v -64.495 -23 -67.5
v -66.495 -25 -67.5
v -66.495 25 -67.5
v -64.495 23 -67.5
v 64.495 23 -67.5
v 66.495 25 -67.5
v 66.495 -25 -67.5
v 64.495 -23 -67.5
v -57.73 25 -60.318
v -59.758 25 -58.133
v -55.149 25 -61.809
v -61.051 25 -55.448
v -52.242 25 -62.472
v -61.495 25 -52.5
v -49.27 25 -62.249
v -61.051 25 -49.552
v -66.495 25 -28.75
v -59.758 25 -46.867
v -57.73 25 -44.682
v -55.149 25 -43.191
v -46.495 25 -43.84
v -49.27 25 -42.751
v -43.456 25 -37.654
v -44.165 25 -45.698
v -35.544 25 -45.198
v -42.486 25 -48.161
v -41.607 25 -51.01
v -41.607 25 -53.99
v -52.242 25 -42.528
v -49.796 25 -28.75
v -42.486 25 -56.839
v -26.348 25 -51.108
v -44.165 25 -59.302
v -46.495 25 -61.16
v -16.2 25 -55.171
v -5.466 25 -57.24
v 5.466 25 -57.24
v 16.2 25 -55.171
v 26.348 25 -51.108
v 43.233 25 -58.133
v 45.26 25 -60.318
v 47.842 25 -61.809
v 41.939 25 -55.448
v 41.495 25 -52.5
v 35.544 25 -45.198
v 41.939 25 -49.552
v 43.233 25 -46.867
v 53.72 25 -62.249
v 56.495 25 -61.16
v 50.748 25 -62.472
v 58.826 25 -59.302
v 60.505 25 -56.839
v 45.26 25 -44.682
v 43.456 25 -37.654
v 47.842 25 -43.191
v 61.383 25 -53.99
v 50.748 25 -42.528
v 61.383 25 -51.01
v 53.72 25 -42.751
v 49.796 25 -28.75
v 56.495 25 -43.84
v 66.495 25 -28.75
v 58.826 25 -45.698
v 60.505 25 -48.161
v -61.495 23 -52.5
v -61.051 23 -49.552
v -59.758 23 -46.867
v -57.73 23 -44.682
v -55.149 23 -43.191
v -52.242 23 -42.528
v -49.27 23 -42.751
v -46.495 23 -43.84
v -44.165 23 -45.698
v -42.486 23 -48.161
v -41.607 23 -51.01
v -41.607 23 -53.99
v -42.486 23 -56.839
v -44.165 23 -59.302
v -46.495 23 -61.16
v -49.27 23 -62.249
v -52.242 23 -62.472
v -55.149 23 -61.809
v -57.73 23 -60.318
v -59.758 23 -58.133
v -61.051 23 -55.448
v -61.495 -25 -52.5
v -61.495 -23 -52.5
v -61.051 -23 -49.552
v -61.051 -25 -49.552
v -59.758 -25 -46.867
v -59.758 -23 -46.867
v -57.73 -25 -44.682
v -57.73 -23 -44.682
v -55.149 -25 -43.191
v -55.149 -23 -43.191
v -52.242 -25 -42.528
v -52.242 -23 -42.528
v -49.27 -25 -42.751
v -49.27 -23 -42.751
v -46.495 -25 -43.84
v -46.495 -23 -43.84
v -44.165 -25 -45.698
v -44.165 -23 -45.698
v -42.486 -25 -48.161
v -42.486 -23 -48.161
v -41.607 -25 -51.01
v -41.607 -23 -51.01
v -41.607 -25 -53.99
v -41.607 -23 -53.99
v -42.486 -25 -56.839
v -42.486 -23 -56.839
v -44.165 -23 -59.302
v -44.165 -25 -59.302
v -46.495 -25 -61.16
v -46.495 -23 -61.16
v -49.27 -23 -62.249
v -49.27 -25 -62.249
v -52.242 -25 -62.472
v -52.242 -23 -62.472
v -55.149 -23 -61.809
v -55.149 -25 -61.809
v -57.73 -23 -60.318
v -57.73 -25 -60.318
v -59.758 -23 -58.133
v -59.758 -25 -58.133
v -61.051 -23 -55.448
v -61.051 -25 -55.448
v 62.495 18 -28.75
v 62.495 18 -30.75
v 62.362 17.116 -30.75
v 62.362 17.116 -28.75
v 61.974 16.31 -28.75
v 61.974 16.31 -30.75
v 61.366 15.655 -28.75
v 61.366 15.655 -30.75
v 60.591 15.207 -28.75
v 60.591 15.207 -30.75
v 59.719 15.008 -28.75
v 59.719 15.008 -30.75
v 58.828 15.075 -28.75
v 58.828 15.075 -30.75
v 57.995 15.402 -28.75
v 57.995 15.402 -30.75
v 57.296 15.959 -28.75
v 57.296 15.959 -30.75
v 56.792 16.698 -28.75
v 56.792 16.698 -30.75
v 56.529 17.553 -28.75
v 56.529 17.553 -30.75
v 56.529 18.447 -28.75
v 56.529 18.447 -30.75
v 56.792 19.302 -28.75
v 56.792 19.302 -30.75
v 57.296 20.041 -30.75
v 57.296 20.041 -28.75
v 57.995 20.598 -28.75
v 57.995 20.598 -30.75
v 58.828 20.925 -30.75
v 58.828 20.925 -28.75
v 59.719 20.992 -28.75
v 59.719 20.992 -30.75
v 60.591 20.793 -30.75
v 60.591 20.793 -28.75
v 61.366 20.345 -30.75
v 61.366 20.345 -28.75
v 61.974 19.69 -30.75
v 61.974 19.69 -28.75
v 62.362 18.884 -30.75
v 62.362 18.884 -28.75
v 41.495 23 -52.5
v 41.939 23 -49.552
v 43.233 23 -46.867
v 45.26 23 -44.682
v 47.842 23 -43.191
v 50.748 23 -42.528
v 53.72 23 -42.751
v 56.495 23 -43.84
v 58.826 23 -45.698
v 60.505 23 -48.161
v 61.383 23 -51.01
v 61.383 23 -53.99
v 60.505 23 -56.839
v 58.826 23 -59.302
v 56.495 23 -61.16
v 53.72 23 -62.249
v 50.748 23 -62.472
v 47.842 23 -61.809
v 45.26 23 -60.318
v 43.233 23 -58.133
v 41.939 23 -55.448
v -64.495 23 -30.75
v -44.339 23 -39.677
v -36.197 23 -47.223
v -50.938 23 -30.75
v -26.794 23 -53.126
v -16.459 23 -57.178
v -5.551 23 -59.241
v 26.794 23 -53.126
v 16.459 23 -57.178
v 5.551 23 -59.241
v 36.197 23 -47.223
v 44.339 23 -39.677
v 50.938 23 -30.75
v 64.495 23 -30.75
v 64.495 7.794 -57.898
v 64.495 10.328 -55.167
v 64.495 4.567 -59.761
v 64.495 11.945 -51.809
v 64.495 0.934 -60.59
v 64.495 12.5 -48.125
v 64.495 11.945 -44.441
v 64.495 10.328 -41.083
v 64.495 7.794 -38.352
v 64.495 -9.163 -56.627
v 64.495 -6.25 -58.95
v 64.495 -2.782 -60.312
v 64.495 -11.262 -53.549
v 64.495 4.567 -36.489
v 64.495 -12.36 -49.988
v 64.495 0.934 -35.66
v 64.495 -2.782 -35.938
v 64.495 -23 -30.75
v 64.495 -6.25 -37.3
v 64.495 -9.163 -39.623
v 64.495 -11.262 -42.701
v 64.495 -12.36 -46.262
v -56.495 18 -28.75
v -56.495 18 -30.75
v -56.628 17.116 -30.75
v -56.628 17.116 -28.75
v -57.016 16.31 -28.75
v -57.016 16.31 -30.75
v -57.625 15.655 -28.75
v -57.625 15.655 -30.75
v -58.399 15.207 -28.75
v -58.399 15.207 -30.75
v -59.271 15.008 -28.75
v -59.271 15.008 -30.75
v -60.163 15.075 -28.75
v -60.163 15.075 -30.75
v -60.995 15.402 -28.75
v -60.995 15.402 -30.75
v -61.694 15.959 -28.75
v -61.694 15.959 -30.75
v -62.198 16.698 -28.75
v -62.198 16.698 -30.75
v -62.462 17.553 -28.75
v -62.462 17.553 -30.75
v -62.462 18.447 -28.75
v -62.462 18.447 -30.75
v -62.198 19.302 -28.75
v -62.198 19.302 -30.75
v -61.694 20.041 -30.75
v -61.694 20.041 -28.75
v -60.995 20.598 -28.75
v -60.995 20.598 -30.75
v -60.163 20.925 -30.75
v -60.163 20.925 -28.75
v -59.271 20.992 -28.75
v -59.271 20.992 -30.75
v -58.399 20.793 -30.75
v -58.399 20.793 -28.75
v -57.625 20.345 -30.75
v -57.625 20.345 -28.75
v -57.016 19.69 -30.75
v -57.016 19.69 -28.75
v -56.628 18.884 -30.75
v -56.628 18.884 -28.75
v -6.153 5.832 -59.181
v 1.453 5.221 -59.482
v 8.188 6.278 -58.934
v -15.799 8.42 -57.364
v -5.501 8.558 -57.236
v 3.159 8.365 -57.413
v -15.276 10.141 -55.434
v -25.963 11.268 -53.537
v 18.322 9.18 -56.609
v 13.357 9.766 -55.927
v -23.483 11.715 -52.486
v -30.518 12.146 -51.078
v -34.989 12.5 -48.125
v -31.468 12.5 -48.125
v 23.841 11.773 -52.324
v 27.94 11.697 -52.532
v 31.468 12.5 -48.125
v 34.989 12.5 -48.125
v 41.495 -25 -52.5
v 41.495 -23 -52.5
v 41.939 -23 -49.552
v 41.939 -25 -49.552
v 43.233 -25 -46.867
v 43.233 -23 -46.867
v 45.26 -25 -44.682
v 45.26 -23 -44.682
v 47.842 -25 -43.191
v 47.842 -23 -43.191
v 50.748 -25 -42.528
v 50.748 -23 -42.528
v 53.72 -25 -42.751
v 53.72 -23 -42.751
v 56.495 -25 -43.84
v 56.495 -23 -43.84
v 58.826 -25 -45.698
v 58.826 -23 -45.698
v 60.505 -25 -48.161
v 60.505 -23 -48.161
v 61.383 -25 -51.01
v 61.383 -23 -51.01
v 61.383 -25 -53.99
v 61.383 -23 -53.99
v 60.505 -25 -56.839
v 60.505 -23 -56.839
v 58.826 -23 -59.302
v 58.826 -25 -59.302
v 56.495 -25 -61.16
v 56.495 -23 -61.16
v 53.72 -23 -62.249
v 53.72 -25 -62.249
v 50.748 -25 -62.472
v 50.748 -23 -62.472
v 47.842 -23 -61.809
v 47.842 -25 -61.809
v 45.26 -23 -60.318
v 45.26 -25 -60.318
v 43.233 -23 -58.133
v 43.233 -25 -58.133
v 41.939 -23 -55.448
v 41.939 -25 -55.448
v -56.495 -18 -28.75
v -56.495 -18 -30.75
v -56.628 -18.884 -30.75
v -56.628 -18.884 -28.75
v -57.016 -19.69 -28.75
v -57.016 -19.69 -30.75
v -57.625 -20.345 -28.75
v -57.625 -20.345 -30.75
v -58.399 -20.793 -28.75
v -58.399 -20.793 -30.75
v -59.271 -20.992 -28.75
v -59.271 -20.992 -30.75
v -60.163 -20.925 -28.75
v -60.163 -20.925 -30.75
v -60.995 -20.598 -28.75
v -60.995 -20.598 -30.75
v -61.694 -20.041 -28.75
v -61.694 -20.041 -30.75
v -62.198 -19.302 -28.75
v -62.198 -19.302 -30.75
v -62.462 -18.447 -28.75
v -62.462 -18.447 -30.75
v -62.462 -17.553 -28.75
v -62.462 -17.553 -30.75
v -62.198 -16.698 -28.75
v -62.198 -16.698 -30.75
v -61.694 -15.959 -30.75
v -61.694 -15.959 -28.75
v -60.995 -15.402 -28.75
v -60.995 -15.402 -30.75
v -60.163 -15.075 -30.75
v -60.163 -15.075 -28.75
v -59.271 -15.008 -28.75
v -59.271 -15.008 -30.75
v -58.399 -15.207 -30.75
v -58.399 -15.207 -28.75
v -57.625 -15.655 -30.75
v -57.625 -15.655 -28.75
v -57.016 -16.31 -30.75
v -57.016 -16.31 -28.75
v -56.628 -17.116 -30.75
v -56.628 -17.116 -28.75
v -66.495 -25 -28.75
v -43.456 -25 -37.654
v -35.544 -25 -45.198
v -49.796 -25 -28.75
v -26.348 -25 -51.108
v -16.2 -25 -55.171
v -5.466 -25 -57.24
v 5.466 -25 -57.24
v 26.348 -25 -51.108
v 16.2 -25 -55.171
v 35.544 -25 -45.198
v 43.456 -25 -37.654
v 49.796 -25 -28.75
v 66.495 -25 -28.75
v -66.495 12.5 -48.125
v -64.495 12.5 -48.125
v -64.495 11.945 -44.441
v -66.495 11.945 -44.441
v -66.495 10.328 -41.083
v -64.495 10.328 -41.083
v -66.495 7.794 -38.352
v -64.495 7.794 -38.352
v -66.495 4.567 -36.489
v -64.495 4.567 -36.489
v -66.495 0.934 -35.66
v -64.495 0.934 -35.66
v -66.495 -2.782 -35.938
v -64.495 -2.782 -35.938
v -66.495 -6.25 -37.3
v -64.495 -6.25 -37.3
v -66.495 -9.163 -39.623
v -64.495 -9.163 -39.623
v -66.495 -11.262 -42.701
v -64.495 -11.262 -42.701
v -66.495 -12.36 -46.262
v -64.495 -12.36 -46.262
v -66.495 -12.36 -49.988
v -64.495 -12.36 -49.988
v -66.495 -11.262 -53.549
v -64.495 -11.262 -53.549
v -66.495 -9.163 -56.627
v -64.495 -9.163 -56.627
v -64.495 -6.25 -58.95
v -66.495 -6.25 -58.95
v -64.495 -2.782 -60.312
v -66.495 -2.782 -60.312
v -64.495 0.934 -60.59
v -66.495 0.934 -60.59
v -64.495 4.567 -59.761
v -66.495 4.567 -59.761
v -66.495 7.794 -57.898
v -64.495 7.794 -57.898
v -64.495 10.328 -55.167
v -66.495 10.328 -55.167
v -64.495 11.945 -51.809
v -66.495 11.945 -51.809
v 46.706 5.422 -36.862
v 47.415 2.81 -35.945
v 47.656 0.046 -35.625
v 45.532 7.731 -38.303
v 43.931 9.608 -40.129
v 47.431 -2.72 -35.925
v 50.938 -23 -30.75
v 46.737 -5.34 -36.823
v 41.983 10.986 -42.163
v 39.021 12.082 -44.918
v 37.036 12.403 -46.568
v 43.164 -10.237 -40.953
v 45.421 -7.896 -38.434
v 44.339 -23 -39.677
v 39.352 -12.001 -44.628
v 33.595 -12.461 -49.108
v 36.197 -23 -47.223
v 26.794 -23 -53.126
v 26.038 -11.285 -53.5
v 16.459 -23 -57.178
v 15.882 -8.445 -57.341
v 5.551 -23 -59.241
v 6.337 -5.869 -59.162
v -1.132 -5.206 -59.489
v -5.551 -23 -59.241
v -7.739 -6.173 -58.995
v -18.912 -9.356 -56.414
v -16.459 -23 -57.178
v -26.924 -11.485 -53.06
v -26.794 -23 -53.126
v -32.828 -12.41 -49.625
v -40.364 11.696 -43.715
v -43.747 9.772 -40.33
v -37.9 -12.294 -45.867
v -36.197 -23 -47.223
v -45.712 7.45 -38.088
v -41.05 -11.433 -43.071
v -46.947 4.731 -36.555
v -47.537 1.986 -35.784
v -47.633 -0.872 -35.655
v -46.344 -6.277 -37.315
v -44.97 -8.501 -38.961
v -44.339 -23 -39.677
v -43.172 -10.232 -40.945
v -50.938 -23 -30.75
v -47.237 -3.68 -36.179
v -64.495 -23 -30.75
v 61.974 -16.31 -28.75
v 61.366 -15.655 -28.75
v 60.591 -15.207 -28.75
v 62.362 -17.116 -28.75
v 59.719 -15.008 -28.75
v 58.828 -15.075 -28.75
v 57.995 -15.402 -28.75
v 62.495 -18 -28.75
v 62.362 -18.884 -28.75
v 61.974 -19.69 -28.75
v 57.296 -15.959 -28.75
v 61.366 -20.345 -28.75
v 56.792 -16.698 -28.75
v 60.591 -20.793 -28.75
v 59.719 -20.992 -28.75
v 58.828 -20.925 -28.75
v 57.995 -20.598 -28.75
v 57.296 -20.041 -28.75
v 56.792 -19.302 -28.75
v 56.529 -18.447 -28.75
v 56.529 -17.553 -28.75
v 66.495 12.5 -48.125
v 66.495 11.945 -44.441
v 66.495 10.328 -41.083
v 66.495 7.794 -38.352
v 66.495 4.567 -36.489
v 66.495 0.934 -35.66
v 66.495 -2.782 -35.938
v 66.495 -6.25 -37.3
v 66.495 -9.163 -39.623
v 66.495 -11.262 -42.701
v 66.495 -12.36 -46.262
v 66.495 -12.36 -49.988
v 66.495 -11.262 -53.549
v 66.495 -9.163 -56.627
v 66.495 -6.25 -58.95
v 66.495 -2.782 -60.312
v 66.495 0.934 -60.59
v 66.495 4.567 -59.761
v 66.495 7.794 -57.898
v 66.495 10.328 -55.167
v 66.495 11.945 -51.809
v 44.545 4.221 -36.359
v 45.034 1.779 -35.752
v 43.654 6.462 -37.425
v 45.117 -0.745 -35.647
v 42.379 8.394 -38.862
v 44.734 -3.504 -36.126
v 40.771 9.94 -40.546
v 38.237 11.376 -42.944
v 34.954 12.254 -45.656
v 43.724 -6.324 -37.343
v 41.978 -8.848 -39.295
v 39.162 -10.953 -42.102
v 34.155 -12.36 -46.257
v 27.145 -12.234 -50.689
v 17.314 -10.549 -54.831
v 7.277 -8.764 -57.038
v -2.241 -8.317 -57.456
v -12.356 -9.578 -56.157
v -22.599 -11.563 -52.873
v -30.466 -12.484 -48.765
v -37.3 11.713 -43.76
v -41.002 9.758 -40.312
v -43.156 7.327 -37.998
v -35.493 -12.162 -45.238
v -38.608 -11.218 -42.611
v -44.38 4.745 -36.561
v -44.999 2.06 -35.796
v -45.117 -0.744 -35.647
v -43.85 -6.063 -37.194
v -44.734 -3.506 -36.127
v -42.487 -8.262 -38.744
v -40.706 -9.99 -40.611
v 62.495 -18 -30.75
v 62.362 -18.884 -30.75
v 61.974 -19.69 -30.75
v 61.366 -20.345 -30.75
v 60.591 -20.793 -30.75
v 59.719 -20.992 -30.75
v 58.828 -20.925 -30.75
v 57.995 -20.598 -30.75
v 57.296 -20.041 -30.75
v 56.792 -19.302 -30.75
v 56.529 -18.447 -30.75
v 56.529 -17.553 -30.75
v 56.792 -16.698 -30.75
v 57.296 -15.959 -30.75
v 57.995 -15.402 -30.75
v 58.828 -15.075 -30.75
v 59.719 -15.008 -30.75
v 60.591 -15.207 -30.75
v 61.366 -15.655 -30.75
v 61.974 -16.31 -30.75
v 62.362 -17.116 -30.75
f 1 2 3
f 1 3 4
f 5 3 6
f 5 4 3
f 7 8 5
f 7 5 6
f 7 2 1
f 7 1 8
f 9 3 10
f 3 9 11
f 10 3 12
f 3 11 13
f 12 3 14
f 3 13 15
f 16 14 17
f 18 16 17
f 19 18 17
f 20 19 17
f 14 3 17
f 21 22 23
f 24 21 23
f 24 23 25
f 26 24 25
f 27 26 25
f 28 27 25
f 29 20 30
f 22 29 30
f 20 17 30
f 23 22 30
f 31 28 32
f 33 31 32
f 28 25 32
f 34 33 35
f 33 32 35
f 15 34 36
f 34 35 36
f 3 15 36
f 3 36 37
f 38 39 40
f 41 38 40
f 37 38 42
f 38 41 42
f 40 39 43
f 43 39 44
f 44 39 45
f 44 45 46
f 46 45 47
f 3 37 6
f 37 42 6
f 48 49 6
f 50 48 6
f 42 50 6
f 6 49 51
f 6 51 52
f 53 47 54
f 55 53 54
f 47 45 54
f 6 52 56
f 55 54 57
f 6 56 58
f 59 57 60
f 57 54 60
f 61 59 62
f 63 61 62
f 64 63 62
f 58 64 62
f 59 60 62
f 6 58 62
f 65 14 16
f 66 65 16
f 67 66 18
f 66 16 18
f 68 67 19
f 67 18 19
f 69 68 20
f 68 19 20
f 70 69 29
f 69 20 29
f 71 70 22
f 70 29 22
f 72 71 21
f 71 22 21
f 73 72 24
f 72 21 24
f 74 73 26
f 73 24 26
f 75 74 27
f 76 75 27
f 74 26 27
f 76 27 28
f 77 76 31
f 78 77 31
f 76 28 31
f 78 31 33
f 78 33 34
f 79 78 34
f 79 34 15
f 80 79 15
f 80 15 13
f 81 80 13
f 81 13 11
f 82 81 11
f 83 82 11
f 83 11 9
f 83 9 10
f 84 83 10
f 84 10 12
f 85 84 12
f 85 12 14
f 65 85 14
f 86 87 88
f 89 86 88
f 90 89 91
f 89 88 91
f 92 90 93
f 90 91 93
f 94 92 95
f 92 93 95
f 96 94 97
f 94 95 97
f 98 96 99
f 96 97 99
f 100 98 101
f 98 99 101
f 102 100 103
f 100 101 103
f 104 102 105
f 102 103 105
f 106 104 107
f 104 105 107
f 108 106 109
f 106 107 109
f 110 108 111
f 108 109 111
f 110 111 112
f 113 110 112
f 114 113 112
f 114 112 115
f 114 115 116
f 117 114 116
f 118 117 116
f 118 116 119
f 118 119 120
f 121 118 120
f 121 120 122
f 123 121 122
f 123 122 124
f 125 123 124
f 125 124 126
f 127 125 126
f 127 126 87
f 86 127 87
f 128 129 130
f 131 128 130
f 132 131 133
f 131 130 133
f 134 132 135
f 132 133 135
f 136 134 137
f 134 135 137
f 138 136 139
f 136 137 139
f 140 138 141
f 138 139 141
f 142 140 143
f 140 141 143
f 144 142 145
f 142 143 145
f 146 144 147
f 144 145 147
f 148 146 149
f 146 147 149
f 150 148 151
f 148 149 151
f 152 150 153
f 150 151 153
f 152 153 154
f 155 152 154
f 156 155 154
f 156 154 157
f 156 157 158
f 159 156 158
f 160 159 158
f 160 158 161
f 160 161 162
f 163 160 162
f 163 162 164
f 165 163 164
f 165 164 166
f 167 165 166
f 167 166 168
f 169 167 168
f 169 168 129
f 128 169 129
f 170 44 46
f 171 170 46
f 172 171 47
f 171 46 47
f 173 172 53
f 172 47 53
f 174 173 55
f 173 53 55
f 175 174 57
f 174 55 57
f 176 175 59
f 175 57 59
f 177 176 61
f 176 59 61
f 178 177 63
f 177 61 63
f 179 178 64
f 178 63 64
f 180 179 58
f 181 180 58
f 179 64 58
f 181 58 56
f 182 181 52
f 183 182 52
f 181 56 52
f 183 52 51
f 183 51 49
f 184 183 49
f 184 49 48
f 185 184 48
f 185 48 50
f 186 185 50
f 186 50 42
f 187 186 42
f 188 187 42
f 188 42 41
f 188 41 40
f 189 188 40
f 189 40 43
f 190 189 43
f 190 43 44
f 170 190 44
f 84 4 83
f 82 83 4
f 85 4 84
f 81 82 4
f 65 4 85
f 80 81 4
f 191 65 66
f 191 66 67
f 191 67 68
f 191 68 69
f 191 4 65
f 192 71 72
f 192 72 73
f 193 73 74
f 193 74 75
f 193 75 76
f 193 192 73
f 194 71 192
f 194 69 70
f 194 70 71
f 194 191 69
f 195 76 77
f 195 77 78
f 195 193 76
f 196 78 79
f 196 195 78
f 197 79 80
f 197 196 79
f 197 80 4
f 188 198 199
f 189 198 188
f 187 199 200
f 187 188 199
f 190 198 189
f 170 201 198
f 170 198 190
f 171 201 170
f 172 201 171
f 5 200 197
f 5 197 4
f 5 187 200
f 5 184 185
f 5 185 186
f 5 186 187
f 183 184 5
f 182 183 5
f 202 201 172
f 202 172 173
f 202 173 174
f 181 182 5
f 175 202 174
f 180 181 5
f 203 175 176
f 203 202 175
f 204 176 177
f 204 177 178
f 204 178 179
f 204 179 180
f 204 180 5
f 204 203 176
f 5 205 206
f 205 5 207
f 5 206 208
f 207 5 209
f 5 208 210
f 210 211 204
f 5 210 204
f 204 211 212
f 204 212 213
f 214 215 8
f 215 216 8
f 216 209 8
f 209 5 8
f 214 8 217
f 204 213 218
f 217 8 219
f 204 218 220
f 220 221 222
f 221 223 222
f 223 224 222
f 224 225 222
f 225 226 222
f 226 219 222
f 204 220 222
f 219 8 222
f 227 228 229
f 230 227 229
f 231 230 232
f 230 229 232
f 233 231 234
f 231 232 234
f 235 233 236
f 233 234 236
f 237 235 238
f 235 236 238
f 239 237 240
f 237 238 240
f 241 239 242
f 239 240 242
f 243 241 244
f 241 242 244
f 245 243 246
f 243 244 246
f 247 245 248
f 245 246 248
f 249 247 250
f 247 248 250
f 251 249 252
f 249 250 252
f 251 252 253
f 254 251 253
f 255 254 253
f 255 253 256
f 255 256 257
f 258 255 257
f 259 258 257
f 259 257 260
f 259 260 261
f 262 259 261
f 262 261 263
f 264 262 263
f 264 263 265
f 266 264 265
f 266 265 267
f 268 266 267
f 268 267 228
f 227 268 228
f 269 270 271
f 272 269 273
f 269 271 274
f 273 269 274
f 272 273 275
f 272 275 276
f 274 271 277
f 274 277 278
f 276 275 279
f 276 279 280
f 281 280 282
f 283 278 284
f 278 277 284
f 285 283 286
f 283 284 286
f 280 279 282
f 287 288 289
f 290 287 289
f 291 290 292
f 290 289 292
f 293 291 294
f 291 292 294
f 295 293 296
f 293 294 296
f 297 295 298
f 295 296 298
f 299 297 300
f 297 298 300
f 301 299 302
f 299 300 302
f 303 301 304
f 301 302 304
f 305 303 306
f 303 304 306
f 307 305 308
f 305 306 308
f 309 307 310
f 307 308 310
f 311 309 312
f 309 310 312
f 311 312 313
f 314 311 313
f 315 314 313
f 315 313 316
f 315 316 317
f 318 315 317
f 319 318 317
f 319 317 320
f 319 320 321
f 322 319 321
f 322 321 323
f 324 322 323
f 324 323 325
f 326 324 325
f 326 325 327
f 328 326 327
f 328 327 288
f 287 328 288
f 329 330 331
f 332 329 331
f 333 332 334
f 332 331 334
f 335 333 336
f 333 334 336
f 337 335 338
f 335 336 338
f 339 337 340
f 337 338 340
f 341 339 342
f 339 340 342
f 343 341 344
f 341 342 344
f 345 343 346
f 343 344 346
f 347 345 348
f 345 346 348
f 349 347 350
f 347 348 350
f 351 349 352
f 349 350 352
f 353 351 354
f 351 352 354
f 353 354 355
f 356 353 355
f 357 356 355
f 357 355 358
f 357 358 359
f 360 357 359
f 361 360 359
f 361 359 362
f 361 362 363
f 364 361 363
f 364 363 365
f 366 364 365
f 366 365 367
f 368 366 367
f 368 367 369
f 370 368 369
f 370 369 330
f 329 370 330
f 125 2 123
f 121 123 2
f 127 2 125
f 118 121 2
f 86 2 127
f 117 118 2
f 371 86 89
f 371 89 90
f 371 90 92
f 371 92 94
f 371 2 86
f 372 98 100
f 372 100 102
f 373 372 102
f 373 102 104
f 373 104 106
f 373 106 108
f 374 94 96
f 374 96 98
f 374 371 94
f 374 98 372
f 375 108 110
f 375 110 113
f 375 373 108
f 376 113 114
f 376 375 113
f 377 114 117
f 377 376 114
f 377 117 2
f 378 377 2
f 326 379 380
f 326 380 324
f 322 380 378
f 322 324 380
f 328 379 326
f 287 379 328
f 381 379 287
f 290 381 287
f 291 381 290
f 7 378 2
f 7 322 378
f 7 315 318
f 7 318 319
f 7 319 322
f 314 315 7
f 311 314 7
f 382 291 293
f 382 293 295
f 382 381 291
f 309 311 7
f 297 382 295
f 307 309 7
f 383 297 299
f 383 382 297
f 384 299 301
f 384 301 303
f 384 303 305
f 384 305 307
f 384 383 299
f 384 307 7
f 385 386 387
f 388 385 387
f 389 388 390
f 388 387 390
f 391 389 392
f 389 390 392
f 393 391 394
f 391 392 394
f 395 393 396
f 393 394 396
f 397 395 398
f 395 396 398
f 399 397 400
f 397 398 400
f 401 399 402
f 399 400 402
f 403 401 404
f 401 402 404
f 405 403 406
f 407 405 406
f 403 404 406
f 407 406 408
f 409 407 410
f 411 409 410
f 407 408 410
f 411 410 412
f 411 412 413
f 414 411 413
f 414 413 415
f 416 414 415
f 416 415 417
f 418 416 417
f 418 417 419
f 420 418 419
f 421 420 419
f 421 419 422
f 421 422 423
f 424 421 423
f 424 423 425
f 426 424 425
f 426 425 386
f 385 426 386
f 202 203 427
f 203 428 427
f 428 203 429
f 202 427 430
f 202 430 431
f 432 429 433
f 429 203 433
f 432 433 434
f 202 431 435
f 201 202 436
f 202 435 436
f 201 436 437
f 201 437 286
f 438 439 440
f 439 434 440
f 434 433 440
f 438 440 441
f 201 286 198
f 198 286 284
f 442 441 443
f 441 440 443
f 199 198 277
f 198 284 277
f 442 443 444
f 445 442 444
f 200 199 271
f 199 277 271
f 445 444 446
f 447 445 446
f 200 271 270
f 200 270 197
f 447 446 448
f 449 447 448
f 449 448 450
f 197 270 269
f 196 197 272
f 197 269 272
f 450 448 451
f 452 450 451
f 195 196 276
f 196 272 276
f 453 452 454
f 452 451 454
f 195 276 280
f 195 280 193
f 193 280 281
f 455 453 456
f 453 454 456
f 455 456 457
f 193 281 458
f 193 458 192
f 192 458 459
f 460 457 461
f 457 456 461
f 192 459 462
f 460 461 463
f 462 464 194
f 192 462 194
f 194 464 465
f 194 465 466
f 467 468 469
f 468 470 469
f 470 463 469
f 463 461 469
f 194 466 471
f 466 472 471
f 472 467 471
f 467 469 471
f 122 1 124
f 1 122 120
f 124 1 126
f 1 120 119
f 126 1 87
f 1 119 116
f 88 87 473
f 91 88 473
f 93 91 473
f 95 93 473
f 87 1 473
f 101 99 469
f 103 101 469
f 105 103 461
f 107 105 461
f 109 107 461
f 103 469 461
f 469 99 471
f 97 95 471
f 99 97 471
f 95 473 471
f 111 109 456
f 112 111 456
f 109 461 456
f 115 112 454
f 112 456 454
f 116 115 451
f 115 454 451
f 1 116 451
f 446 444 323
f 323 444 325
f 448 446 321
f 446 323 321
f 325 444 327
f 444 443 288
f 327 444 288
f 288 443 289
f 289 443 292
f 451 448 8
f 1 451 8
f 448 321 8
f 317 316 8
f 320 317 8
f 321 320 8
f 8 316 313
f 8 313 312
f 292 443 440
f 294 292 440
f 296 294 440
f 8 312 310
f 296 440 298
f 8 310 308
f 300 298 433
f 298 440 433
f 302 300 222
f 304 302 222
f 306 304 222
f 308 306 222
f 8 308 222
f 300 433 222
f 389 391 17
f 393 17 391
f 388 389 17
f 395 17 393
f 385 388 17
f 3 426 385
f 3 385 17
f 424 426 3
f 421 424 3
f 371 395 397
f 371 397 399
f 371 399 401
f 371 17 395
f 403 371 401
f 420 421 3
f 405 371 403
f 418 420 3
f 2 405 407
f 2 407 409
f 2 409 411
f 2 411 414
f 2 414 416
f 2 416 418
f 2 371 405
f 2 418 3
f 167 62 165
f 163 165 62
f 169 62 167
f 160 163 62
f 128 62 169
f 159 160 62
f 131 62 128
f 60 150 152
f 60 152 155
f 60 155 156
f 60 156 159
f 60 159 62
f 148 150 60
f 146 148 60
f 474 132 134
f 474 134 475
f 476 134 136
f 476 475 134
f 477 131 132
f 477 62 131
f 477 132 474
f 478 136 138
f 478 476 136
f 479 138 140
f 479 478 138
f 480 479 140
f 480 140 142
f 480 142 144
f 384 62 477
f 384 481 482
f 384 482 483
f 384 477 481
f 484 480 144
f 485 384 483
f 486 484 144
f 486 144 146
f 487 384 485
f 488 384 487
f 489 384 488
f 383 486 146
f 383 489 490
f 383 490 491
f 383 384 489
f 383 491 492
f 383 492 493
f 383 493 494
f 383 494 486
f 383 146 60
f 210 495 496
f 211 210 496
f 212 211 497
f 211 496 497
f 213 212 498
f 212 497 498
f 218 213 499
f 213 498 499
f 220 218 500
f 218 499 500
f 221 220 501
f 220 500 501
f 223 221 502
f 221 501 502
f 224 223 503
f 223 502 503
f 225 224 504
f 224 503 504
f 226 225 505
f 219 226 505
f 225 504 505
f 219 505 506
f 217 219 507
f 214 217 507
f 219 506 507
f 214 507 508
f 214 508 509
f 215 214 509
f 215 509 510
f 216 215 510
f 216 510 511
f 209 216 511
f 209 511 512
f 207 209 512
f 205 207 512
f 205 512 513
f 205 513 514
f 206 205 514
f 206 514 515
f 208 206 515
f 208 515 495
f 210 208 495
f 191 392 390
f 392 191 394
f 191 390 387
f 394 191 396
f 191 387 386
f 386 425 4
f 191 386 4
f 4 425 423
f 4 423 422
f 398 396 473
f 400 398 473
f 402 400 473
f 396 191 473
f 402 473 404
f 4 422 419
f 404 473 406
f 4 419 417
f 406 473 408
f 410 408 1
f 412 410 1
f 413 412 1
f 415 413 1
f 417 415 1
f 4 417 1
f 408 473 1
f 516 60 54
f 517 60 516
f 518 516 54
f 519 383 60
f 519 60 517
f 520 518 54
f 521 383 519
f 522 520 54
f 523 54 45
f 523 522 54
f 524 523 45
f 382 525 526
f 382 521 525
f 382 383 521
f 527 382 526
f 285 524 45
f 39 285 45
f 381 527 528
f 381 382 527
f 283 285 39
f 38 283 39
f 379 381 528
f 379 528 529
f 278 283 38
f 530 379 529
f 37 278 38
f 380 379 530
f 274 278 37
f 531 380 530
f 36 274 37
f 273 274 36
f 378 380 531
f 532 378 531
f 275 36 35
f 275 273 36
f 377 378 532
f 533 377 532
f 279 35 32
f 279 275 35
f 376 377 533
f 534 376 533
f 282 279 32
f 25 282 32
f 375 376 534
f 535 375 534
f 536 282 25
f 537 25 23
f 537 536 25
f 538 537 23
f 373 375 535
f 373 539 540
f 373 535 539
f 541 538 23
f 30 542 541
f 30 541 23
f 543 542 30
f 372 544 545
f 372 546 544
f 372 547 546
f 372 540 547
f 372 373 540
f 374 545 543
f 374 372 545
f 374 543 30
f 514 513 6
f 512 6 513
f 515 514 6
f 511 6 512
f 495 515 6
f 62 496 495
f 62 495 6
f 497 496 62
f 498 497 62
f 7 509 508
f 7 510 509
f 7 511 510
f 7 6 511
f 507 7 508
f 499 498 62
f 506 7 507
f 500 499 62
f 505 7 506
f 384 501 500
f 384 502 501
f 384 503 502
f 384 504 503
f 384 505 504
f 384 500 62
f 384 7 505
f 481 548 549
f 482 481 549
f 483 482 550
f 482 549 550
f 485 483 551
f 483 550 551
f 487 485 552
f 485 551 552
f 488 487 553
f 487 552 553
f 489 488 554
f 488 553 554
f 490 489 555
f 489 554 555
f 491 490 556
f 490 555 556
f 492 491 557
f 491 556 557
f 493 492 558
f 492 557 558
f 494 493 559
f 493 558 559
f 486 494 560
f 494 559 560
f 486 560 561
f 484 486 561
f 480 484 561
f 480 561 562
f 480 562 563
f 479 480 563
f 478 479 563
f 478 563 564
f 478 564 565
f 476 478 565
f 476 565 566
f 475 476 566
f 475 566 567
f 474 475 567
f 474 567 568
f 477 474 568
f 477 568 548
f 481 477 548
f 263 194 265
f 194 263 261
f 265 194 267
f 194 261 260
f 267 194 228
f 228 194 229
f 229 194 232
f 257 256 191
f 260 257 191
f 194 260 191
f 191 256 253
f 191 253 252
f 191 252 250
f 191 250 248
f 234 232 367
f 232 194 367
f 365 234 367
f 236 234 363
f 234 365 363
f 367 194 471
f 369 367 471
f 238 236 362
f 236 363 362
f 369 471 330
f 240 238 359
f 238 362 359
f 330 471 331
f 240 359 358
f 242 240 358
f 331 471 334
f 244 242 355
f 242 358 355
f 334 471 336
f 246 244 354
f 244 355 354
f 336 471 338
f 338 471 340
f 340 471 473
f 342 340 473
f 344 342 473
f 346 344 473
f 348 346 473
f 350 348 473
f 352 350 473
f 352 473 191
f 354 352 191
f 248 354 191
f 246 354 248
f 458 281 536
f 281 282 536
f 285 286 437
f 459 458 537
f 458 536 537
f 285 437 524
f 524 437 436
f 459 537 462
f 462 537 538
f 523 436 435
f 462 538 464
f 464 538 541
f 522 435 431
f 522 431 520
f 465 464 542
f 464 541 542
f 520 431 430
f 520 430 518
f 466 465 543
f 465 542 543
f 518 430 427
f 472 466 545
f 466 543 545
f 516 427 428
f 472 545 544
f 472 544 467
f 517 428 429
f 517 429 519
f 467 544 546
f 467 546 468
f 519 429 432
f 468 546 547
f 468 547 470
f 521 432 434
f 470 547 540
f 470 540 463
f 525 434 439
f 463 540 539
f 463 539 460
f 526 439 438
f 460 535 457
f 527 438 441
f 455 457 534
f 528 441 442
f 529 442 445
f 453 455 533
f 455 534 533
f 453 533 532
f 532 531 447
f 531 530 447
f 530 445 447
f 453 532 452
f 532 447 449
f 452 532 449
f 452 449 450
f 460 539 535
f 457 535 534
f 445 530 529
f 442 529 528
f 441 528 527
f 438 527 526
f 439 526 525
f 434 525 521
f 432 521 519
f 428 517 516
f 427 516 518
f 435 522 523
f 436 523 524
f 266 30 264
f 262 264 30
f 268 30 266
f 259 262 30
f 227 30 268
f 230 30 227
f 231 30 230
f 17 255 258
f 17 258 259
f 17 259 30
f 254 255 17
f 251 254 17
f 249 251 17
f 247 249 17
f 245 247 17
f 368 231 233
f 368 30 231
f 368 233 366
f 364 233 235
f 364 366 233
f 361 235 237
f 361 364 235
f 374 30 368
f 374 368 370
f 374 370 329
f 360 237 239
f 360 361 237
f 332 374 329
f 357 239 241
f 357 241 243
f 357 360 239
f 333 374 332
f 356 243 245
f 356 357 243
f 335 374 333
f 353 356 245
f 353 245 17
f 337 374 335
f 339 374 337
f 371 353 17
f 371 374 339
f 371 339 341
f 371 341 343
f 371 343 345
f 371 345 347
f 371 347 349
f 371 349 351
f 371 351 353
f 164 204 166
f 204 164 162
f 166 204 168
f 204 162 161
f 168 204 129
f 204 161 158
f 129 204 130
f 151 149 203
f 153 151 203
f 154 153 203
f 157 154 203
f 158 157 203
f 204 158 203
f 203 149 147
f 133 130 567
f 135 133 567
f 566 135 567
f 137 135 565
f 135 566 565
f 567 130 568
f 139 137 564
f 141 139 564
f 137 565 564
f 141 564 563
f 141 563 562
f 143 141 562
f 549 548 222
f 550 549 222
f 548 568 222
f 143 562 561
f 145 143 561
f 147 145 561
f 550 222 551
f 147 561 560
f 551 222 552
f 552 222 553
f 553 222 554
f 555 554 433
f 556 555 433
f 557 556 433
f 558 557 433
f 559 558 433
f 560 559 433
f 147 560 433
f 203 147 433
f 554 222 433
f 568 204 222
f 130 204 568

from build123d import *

# Parameters (mm, degrees)
F1_DEPTH      = 25
F1_DEPTH_BACK = 25
F2_T          = -2
F3_R          = 3
F4_DEPTH      = 73
F6_R          = 12.5
F7_DEPTH      = 142.6
F8_R          = 10
F9_DEPTH      = 5
F9_DEPTH_BACK = 60


with BuildPart() as f1:
    # F0 (on Front) → F1 (new body, two sides)
    with BuildSketch(Plane.XZ) as f1_sk:
        with BuildLine():
            ThreePointArc((49.796461, -28.75), (0, -57.5), (-49.796461, -28.75))
            Line((-49.796461, -28.75), (-61.038751, -28.75))
            Line((-61.038751, -28.75), (-66.495191, -28.75))
            Line((-66.495191, -28.75), (-66.495191, -67.5))
            Line((-66.495191, -67.5), (-49.796461, -67.5))
            Line((-49.796461, -67.5), (-43.30127, -67.5))
            Line((-43.30127, -67.5), (0, -67.5))
            Line((0, -67.5), (43.30127, -67.5))
            Line((43.30127, -67.5), (66.495191, -67.5))
            Line((66.495191, -67.5), (66.495191, -28.75))
            Line((66.495191, -28.75), (49.796461, -28.75))
        make_face()
    extrude(amount=F1_DEPTH)
    extrude(f1_sk.sketch, amount=-F1_DEPTH_BACK)

    # F2
    f2_openings = [f1.faces().sort_by_distance(p)[0] for p in [
        (0, 0, -67.5),
    ]]
    offset(amount=F2_T, openings=f2_openings)

    # F3 (on face) → F4 (cut)
    with BuildSketch(Plane(origin=(0, 0, -67.5), x_dir=(1, 0, 0), z_dir=(0, 0, -1))):
        with Locations((59.495191, 18)):
            Circle(F3_R)
        with Locations((-59.495191, 18)):
            Circle(F3_R)
        with Locations((59.495191, -18)):
            Circle(F3_R)
        with Locations((-59.495191, -18)):
            Circle(F3_R)
    extrude(amount=-F4_DEPTH, mode=Mode.SUBTRACT)

    # F6 (on face) → F7 (cut)
    with BuildSketch(Plane.YZ.offset(66.495191)):
        with Locations((0, -48.125)):
            Circle(F6_R)
    extrude(amount=-F7_DEPTH, mode=Mode.SUBTRACT)

    # F8 (on face) → F9 (cut, two sides)
    with BuildSketch(Plane(origin=(0, 25, 0), x_dir=(-1, 0, 0), z_dir=(0, 1, 0))) as f9_sk:
        with Locations((-51.495191, -52.5)):
            Circle(F8_R)
        with Locations((51.495191, -52.5)):
            Circle(F8_R)
    extrude(amount=F9_DEPTH, mode=Mode.SUBTRACT)
    extrude(f9_sk.sketch, amount=-F9_DEPTH_BACK, mode=Mode.SUBTRACT)


solid = f1.part
